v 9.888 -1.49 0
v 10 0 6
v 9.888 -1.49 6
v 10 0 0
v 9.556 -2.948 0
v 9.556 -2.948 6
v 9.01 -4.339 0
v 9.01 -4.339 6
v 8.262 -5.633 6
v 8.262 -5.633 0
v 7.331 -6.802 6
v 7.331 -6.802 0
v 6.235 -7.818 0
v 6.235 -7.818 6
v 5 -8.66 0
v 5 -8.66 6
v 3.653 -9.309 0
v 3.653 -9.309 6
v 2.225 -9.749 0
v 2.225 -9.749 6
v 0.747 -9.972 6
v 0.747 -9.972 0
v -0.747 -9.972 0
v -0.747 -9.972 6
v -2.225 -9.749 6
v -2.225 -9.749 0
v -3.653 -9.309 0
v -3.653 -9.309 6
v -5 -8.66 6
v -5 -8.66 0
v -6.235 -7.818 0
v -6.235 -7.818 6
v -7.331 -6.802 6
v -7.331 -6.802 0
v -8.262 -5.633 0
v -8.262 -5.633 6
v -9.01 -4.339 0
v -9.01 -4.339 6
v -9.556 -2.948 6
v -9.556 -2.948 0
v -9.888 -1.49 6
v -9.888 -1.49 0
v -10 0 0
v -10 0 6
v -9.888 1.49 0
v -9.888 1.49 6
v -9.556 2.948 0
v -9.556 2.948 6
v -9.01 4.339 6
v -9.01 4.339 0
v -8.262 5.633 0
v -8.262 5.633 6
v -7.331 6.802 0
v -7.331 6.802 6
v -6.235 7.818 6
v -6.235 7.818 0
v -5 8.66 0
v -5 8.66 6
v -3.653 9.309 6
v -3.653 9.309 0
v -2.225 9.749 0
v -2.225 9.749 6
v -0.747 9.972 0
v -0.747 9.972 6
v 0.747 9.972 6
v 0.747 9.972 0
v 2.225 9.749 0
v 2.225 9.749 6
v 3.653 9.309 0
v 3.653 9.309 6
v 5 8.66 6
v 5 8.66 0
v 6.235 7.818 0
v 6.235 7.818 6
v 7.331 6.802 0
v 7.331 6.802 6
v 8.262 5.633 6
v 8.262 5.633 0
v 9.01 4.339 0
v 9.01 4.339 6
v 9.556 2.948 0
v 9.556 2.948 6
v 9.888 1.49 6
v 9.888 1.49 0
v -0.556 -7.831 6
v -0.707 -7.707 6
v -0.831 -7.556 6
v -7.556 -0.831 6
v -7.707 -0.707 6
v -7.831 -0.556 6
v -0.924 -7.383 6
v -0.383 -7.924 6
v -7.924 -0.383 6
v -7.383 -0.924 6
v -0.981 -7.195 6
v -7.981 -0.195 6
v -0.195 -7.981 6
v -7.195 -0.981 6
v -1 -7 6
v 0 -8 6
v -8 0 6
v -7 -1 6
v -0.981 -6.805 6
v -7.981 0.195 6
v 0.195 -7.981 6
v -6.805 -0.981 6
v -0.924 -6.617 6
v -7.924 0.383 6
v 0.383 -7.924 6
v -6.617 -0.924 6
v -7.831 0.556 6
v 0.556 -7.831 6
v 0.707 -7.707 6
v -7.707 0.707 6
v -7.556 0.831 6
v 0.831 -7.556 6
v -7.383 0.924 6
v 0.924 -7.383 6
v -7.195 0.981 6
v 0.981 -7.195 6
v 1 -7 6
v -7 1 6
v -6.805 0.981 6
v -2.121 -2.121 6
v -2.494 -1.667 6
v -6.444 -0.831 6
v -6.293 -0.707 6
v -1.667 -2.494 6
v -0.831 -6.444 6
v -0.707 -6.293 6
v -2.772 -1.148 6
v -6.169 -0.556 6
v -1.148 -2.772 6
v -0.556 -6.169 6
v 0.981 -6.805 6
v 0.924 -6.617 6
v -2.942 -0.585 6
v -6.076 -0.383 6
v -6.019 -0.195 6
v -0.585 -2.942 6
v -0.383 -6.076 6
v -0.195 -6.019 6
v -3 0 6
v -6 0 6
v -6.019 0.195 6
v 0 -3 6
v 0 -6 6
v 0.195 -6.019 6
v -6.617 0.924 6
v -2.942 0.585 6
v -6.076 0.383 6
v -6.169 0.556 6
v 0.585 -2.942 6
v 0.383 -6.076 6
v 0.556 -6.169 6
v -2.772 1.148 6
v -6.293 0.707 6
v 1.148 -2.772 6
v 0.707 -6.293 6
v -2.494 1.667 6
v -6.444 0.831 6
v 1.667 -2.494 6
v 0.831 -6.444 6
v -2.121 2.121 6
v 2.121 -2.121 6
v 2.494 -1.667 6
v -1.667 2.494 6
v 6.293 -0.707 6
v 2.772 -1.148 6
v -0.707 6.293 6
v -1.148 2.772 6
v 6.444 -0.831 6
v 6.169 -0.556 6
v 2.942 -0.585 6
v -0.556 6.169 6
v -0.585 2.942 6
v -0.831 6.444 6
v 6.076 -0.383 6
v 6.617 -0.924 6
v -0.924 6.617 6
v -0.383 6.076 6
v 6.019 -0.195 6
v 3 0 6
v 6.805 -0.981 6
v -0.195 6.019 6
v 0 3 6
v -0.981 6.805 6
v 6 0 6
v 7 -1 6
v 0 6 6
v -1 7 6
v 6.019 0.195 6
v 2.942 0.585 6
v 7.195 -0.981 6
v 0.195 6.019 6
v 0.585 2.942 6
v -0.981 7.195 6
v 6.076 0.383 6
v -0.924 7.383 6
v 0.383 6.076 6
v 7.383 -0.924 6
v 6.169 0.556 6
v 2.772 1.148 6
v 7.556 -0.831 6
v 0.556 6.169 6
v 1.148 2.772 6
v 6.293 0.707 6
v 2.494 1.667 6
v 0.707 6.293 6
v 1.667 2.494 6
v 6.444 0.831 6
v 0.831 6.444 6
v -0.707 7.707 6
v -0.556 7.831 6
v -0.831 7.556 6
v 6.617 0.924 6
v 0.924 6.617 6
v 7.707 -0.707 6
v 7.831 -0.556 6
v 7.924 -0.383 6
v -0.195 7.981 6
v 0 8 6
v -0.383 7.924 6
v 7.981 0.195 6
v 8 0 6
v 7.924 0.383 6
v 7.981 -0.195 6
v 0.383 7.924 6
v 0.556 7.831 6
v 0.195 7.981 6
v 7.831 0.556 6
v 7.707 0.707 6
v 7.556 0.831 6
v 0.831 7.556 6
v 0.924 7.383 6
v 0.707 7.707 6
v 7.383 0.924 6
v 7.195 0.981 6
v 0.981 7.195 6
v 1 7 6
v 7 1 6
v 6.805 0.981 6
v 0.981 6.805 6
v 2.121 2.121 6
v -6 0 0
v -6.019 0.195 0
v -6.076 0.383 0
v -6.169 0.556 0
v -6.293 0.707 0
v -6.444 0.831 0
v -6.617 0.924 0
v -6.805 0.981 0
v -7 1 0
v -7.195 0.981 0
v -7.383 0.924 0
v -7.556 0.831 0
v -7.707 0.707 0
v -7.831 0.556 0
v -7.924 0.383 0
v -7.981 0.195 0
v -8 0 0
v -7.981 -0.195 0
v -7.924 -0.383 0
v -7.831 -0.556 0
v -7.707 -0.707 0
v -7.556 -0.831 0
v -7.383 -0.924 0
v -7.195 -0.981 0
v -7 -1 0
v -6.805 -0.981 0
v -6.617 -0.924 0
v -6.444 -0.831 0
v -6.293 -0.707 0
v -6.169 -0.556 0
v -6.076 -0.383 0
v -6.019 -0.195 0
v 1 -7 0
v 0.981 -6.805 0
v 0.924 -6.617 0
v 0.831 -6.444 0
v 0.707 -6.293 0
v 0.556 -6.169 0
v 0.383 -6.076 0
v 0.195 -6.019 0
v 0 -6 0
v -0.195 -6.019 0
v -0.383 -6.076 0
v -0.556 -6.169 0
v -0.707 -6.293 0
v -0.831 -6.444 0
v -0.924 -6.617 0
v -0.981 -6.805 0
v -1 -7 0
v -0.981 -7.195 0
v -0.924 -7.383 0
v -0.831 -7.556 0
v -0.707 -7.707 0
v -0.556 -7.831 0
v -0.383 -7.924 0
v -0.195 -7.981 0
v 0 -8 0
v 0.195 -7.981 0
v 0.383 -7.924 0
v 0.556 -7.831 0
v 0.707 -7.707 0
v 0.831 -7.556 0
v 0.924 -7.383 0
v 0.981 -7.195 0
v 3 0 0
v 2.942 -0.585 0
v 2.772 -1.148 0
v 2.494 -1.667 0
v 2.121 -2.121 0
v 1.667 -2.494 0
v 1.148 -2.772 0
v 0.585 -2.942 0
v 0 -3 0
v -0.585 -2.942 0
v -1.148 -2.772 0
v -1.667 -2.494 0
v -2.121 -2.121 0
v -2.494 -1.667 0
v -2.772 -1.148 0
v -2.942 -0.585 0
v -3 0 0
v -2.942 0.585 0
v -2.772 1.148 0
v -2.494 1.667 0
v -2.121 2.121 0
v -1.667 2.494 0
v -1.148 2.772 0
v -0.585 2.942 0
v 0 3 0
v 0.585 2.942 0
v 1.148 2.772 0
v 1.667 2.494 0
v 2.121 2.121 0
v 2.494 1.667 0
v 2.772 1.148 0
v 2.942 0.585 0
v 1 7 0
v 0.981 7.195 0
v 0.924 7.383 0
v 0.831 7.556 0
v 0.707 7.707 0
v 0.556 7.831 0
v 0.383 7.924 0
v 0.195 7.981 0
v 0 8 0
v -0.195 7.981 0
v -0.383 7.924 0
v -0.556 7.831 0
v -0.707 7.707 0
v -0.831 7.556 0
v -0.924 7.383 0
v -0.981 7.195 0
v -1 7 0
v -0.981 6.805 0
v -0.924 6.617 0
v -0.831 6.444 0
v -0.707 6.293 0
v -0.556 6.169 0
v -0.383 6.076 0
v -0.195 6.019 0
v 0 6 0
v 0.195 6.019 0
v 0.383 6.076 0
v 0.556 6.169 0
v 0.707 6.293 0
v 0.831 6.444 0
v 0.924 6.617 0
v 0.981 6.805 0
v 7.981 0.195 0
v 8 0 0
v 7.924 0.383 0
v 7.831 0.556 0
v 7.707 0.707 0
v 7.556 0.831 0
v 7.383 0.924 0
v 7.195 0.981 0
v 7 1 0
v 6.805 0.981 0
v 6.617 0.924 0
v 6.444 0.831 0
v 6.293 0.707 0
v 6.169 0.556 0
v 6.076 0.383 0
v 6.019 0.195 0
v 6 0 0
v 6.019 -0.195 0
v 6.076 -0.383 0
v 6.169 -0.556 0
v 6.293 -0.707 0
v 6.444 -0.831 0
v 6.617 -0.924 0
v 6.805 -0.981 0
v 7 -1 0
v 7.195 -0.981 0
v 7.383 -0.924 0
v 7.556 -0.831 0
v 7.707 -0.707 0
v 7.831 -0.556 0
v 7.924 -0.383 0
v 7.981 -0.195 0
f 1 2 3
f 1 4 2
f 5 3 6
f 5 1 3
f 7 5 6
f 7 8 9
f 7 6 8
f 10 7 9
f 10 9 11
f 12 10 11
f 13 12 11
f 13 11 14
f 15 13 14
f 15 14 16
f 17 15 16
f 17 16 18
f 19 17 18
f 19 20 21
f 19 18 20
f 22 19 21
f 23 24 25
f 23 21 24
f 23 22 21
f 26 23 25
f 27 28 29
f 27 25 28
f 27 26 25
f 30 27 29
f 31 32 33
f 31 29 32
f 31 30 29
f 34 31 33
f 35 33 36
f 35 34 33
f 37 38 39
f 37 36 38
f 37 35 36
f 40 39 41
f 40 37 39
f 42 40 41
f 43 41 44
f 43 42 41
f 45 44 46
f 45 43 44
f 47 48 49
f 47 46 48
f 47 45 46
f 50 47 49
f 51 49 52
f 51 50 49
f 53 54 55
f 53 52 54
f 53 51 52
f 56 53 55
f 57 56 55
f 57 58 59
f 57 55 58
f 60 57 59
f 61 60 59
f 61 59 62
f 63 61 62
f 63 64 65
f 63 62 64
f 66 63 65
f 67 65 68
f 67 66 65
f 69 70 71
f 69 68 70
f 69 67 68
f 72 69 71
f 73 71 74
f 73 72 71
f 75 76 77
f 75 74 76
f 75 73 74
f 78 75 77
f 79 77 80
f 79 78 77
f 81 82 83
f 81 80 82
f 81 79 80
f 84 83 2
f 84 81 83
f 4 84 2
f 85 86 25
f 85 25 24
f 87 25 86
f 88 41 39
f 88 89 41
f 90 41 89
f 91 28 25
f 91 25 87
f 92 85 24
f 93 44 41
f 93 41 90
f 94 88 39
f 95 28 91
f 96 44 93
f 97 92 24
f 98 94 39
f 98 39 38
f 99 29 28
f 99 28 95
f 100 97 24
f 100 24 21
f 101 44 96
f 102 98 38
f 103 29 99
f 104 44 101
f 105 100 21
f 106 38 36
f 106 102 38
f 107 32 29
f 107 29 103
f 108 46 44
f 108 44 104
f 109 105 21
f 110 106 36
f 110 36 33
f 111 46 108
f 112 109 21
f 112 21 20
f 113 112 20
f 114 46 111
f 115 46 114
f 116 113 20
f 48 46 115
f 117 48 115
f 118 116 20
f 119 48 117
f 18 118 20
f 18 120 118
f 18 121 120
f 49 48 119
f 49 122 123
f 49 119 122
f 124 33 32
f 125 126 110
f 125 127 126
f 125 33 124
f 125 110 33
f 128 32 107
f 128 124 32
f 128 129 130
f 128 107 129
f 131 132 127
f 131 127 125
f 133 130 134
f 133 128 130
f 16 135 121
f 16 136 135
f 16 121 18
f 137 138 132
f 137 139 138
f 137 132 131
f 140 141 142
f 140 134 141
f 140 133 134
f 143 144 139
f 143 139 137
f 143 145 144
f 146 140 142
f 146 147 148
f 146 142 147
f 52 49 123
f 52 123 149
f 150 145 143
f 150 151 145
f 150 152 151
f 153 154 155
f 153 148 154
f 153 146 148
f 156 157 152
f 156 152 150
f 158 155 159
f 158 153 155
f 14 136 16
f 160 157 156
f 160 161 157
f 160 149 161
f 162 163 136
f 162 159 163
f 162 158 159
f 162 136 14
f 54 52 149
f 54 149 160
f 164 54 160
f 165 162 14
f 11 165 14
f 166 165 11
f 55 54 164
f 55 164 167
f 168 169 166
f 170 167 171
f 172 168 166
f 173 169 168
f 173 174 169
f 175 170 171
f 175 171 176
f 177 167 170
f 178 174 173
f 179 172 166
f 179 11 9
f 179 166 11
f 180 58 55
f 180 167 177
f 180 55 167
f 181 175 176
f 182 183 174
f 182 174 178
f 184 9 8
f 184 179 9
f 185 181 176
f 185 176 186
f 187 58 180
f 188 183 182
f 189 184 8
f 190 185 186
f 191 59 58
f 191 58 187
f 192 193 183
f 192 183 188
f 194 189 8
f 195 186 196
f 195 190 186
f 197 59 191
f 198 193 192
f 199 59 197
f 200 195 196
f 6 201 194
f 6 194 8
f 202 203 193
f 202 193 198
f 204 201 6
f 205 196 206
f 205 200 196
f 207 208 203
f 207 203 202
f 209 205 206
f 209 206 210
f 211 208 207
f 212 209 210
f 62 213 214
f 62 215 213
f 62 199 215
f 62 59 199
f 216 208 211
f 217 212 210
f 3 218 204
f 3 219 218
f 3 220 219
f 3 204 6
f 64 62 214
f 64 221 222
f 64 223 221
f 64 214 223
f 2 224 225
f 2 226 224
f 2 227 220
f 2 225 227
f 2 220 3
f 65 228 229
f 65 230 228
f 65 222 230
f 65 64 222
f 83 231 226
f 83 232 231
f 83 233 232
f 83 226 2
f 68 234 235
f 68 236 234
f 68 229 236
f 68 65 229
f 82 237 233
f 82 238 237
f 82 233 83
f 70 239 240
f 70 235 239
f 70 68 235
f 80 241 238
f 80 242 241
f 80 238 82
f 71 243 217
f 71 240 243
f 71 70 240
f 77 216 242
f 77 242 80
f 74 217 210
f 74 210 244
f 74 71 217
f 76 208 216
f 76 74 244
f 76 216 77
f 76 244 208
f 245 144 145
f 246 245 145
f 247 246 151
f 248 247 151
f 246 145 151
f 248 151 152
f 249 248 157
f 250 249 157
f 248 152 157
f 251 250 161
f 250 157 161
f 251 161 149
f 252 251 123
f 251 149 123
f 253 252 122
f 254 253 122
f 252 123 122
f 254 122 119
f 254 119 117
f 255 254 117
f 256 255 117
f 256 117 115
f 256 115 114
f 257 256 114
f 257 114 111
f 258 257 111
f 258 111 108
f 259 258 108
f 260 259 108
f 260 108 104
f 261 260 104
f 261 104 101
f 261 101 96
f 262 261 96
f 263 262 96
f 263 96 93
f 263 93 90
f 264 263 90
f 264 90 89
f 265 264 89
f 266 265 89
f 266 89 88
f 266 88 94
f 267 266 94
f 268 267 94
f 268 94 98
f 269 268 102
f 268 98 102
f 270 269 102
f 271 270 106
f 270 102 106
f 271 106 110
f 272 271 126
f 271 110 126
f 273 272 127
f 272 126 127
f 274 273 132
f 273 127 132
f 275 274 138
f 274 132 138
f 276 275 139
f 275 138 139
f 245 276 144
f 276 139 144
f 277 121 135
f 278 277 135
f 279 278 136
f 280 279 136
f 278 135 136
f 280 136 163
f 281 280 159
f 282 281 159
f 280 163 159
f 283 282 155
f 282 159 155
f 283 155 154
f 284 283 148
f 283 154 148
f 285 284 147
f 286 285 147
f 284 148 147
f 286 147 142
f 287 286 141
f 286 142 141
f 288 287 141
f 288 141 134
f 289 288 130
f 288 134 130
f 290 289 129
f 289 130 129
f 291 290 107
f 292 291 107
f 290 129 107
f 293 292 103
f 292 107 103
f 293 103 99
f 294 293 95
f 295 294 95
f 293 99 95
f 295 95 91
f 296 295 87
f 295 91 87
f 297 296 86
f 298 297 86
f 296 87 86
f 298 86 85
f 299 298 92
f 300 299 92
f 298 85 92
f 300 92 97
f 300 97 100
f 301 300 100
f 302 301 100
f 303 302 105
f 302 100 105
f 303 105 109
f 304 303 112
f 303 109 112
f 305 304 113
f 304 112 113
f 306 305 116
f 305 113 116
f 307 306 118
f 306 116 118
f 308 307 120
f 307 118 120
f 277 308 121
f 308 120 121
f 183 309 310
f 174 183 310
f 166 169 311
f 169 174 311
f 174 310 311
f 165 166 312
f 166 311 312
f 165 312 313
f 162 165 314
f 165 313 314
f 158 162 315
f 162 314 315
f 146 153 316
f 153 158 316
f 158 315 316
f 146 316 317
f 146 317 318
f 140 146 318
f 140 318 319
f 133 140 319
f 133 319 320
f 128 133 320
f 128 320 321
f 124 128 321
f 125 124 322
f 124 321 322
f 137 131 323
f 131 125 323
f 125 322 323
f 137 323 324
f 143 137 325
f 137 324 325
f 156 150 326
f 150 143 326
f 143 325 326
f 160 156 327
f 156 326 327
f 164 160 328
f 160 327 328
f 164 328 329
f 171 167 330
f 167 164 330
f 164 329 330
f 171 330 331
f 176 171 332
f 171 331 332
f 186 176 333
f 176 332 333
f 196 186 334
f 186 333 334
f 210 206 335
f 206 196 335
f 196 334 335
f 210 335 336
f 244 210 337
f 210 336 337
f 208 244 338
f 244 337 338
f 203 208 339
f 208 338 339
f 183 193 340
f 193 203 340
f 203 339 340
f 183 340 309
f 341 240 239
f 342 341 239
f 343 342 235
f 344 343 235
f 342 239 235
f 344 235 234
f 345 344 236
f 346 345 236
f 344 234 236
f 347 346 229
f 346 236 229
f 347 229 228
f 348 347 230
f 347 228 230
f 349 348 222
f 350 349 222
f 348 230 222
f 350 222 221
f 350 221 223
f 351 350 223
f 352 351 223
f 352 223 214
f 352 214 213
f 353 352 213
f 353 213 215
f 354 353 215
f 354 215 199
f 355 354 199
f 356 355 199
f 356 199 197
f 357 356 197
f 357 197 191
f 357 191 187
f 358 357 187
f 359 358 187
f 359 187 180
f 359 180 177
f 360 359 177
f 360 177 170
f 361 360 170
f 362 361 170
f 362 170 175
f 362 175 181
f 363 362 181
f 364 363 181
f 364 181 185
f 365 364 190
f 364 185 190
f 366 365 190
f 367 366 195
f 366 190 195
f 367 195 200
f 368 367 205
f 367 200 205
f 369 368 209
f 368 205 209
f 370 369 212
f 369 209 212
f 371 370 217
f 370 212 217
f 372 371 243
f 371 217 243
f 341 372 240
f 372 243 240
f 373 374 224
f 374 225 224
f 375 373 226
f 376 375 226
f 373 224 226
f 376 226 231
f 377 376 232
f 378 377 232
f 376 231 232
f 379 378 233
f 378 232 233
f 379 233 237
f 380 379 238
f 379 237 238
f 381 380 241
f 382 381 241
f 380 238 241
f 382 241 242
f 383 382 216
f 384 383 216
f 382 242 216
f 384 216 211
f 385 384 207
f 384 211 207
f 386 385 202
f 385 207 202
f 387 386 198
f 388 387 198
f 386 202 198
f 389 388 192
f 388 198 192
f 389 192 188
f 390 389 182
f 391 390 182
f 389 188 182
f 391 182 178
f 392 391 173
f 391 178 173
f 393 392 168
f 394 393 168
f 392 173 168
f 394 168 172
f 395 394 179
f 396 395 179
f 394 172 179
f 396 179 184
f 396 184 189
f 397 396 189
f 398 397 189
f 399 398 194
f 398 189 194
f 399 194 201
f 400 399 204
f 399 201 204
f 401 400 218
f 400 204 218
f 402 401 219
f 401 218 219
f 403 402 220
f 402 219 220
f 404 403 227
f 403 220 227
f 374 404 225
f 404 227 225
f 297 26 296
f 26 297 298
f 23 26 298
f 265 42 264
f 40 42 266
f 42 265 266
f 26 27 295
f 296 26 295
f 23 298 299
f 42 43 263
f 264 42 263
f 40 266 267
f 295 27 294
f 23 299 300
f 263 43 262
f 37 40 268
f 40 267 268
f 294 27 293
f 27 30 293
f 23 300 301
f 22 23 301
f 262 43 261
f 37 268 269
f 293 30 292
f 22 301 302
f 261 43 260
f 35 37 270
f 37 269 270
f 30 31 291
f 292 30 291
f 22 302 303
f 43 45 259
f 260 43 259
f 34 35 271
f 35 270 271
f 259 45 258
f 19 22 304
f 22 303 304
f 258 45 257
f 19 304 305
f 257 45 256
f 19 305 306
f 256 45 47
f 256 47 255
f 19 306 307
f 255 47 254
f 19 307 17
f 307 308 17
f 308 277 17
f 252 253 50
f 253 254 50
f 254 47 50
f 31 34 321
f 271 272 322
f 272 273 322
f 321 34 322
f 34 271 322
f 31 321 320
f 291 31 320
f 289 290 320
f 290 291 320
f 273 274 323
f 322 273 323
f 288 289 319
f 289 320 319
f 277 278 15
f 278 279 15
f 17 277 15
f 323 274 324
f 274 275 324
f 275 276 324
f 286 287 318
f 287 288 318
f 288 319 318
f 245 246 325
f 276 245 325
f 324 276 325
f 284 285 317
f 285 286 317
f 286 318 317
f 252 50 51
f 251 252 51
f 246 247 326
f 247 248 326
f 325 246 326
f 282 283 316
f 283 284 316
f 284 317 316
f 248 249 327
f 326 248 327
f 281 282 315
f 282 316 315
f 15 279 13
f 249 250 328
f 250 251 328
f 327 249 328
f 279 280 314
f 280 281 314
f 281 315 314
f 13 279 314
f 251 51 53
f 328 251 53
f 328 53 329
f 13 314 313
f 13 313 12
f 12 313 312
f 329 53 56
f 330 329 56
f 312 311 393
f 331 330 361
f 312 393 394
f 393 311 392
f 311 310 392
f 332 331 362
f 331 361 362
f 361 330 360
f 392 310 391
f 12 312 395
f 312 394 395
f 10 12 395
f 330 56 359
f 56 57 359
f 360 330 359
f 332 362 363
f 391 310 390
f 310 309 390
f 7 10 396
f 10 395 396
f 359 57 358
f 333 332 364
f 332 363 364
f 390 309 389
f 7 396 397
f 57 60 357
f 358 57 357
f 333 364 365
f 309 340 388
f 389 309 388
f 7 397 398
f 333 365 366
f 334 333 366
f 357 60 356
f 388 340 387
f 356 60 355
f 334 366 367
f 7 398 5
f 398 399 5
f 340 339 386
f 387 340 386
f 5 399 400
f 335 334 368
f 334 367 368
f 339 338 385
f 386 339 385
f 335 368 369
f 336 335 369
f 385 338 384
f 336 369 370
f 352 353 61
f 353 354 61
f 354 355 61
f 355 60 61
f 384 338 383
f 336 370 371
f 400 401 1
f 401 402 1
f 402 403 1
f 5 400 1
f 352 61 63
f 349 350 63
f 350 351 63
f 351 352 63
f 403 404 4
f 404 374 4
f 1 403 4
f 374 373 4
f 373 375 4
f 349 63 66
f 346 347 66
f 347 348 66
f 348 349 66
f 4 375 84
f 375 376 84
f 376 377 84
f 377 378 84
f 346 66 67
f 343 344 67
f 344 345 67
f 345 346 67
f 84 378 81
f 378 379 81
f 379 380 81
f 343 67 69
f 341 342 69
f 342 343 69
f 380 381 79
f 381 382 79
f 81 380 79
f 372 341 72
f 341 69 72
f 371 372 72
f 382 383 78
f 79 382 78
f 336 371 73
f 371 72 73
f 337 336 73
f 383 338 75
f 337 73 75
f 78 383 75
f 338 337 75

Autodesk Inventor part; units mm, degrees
ref_plane "YZ Plane" through (0, 0, 0) normal (1, 0, 0) x (0, 1, 0)
ref_plane "XZ Plane" through (0, 0, 0) normal (0, 1, 0) x (-1, 0, 0)
ref_plane "XY Plane" through (0, 0, 0) normal (0, 0, 1) x (1, 0, 0)
sketch "スケッチ1" plane through (0, 0, 0) normal (0, 0, 1) x (1, 0, 0)
  circle A0 centre (0, 0) radius 3
  circle A1 centre (0, 0) radius 10
  dimension "d0" = 6
  dimension "d1" = 20
extrude "押し出し1" add sketch "スケッチ1" along normal blind 6
sketch "スケッチ3" plane through (0, 0, 6) normal (0, 0, 1) x (1, 0, 0)
  circle A0 centre (0, 0) radius 10
  circle A1 centre (0, 0) radius 7 construction
  circle A2 centre (-7, 0) radius 1
  circle A3 centre (-4.9497, -4.9497) radius 1
  circle A4 centre (4.9497, -4.9497) radius 1
  circle A5 centre (0, -7) radius 1
  circle A6 centre (7, 0) radius 1
  circle A7 centre (4.9497, 4.9497) radius 1
  circle A8 centre (0, 7) radius 1
  circle A9 centre (-4.9497, 4.9497) radius 1
  circle A10 centre (0, 0) radius 5
  circle A11 centre (0, 0) radius 10
  circle A12 centre (0, 0) radius 7 construction
  circle A13 centre (-7, 0) radius 1
  circle A14 centre (-4.9497, -4.9497) radius 1
  circle A15 centre (4.9497, -4.9497) radius 1
  circle A16 centre (0, -7) radius 1
  circle A17 centre (7, 0) radius 1
  circle A18 centre (4.9497, 4.9497) radius 1
  circle A19 centre (0, 7) radius 1
  circle A20 centre (-4.9497, 4.9497) radius 1
  circle A21 centre (0, 0) radius 5
  dimension "d9" = 14
  dimension "d20" = 14
  dimension "d8" = 20
  dimension "d10" = 2
  dimension "d11" = 2
  dimension "d12" = 2
  dimension "d13" = 2
  dimension "d14" = 2
  dimension "d15" = 2
  dimension "d16" = 2
  dimension "d17" = 2
  dimension "d18" = 10
  dimension "d19" = 20
  dimension "d21" = 2
  dimension "d22" = 2
  dimension "d23" = 2
  dimension "d24" = 2
  dimension "d25" = 2
  dimension "d26" = 2
  dimension "d27" = 2
  dimension "d28" = 2
  dimension "d29" = 10
extrude "押し出し3" cut sketch "スケッチ3" against normal blind 10 contours A2 | A5 | A6 | A8
properties part number "Gear20"
